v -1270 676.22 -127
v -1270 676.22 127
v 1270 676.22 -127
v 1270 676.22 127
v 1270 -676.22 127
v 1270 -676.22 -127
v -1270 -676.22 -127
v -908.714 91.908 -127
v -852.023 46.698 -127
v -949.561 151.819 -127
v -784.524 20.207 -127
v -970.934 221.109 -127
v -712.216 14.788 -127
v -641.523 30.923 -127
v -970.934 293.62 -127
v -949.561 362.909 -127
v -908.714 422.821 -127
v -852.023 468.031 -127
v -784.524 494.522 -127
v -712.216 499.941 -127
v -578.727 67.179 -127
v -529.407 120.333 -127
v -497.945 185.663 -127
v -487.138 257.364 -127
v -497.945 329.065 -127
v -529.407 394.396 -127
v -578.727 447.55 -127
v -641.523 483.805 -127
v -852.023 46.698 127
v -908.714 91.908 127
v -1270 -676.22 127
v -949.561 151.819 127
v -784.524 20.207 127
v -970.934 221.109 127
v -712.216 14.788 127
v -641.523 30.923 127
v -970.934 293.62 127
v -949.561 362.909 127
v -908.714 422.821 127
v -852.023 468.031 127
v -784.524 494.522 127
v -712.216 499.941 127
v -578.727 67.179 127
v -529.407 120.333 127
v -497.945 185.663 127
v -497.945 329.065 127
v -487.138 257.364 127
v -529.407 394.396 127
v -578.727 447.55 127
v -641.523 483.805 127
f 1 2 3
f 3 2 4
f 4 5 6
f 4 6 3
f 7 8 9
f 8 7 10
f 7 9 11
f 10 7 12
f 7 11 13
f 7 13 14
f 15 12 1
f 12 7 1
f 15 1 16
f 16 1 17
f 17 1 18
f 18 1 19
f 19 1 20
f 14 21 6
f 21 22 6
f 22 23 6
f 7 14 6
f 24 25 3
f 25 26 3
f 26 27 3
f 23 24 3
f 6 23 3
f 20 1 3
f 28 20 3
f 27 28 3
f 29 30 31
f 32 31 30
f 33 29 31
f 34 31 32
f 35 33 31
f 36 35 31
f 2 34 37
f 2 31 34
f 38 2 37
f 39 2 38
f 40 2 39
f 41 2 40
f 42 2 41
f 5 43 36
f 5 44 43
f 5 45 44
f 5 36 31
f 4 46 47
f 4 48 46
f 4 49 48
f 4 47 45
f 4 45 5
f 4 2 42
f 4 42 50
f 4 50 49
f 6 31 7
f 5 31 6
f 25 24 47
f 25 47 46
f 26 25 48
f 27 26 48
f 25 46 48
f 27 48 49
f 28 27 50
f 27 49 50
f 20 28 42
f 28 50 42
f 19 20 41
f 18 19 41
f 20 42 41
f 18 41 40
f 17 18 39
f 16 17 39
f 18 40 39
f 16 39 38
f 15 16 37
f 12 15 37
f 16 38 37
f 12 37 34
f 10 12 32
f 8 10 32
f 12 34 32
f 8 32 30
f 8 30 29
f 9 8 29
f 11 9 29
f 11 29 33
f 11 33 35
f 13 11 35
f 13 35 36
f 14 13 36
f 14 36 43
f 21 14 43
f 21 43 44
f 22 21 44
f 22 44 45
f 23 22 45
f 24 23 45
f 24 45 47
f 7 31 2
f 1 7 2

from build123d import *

# Parameters (mm, degrees)
F0_W     = 2540
F0_H     = 1352.439214
F1_DEPTH = 127
F2_R     = 243.256461
F3_DEPTH = 254.001


with BuildPart() as f1:
    # F0 (on Top) → F1 (new body, symmetric)
    with BuildSketch(Plane.XY):
        Rectangle(F0_W, F0_H)
    extrude(amount=F1_DEPTH, both=True)

    # F2 (on face) → F3 (cut, through all)
    with BuildSketch(Plane.XY.offset(127)):
        with Locations((-730.394423, 257.364362)):
            Circle(F2_R)
    extrude(amount=-F3_DEPTH, mode=Mode.SUBTRACT)


solid = f1.part
